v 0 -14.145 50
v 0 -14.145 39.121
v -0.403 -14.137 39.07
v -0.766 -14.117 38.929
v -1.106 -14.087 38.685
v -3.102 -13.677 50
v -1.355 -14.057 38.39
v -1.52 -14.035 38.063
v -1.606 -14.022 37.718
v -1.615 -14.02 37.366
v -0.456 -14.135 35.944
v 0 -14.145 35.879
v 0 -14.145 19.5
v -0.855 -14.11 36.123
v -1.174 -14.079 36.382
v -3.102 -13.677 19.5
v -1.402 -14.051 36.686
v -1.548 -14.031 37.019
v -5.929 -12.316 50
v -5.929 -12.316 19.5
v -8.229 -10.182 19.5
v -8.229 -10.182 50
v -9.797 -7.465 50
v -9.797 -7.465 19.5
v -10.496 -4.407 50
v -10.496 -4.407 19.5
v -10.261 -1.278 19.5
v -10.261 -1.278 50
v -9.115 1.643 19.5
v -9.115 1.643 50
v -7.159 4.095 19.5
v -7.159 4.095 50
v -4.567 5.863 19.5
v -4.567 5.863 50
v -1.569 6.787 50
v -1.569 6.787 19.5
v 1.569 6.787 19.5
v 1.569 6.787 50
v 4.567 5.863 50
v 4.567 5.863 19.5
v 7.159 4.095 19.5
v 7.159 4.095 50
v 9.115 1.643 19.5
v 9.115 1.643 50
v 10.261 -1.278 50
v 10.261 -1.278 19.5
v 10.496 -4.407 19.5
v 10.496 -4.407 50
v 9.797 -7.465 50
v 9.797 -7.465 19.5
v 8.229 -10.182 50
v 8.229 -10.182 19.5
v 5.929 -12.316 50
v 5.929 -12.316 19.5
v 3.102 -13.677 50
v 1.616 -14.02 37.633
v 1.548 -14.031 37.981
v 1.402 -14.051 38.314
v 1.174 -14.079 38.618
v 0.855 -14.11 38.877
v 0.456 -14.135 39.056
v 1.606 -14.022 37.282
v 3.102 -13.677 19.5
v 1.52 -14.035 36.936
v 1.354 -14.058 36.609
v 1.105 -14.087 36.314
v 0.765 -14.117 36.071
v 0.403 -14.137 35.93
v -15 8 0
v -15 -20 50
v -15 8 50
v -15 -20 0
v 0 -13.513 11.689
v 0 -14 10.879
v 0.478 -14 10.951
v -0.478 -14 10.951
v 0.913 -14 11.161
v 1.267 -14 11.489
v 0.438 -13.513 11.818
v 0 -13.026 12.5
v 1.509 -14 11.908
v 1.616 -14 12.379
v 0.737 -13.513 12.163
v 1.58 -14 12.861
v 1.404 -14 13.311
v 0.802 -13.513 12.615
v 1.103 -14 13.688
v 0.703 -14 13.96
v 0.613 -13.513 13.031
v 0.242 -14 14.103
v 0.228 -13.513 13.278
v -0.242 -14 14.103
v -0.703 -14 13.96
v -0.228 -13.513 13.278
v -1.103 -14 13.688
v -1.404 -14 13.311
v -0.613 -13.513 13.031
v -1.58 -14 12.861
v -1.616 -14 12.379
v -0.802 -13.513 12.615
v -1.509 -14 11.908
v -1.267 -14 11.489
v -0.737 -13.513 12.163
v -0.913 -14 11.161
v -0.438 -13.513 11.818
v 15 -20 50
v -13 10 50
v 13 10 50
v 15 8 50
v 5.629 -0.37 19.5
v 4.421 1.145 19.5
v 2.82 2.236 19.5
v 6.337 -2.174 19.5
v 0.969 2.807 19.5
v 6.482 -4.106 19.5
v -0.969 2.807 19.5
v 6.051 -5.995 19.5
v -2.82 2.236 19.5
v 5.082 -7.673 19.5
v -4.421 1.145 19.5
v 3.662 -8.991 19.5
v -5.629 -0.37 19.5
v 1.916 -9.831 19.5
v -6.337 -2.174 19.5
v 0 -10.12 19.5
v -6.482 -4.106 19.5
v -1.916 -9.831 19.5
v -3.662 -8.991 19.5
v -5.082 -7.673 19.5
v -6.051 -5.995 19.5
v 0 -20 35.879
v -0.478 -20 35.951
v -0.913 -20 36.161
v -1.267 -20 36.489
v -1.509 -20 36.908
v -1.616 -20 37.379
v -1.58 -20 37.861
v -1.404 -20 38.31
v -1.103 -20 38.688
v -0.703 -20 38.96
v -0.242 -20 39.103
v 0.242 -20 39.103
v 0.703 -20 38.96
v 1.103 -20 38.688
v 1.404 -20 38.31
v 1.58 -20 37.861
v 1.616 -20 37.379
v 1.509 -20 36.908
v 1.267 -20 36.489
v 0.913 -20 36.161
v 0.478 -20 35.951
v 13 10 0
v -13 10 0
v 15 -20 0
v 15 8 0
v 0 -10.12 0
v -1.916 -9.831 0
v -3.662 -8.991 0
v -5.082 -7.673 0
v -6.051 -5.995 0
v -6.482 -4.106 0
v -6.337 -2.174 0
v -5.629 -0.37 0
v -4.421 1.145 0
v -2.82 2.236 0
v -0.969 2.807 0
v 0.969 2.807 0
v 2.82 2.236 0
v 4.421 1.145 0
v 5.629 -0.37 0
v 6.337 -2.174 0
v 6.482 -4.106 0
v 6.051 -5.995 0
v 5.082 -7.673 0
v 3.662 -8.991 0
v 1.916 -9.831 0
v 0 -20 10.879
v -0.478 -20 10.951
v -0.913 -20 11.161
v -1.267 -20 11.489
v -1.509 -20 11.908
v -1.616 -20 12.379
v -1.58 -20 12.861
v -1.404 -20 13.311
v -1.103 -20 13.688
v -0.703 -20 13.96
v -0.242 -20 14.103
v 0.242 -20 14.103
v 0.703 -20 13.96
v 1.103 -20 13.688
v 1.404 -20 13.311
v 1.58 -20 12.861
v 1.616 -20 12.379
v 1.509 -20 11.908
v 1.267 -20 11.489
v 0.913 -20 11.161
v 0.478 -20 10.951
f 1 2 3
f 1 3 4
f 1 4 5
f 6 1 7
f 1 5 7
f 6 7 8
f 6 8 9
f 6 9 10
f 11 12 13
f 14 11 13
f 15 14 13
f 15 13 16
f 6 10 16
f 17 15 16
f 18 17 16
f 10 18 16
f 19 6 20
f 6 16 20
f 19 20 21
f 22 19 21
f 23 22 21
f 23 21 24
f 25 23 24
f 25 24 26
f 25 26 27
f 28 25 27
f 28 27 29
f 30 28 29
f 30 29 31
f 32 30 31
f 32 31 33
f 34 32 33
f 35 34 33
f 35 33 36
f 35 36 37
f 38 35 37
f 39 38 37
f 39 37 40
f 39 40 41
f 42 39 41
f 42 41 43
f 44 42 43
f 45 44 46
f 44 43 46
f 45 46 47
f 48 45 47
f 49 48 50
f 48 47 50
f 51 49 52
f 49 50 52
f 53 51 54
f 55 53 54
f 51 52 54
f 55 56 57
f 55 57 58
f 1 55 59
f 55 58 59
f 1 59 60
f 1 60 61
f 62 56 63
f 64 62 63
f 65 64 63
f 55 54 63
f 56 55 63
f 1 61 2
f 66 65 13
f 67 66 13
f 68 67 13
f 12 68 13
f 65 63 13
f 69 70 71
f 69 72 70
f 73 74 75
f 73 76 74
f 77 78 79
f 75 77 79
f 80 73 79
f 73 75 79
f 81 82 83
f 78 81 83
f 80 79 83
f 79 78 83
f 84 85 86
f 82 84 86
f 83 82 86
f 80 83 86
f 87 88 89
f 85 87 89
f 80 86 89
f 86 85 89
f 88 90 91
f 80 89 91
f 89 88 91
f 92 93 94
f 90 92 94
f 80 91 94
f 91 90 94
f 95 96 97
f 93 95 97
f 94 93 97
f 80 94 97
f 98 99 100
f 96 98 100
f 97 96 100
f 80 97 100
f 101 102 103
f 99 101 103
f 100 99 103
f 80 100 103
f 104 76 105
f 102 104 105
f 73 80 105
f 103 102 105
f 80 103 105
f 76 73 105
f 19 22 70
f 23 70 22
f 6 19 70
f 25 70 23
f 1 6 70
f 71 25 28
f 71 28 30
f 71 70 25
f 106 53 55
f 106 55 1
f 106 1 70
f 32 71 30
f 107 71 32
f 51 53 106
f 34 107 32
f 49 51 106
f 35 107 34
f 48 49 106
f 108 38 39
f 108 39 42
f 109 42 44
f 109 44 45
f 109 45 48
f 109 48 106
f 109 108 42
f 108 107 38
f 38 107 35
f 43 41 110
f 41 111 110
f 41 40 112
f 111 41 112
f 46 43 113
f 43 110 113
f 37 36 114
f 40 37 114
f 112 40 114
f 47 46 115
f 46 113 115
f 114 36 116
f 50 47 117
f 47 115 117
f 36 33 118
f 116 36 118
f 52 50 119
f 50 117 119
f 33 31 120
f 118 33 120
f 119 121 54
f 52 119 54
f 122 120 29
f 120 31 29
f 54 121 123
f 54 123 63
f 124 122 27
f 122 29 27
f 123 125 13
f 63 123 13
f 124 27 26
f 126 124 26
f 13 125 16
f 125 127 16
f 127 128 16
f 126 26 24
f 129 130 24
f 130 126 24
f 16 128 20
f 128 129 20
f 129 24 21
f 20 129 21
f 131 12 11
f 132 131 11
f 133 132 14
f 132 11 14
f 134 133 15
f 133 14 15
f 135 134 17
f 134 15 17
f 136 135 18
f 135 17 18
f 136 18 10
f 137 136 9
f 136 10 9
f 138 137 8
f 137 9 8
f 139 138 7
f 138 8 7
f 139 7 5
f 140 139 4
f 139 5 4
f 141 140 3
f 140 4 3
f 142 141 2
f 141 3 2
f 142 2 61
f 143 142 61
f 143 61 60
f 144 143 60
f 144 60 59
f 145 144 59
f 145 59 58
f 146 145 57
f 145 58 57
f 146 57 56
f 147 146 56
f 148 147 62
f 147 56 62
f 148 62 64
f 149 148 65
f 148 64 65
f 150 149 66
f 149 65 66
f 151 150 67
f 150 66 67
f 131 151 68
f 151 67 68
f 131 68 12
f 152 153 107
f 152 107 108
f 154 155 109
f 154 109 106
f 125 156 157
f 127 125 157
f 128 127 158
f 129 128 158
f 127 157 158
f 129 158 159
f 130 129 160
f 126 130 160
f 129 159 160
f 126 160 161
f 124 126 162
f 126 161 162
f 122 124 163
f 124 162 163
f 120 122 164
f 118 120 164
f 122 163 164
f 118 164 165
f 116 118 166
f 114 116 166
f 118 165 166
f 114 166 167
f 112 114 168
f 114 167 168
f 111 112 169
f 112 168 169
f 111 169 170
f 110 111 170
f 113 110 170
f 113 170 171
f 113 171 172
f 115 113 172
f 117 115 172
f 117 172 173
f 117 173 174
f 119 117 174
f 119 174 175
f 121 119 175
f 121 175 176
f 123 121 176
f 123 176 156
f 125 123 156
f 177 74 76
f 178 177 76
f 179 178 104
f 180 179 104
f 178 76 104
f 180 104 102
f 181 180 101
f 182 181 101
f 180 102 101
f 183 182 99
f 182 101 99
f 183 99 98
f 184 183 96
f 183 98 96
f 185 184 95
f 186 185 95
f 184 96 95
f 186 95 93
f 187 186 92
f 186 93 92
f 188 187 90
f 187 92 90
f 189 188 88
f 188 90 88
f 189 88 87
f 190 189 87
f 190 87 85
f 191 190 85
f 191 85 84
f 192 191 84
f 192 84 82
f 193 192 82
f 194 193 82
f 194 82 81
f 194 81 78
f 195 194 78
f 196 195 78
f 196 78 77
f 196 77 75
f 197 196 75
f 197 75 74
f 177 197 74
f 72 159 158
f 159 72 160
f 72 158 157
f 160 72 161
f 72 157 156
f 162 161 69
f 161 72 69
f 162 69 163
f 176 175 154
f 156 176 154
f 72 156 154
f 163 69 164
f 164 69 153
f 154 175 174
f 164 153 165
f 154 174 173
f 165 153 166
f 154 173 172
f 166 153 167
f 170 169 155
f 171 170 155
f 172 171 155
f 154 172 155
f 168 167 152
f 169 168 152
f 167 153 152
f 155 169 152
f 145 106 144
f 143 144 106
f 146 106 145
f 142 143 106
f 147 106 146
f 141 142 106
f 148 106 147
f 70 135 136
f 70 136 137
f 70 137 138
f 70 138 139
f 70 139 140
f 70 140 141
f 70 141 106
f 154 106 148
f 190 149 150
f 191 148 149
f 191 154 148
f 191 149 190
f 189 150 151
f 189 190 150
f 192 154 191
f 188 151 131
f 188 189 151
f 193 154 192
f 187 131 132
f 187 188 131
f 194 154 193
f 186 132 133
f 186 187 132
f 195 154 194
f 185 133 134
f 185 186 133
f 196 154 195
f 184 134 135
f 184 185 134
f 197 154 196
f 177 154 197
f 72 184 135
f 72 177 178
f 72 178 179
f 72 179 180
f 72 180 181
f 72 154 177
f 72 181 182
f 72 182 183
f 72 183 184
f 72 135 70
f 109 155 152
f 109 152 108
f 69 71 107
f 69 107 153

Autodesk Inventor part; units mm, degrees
ref_plane "YZ Plane" through (0, 0, 0) normal (1, 0, 0) x (0, 1, 0)
ref_plane "XZ Plane" through (0, 0, 0) normal (0, 1, 0) x (-1, 0, 0)
ref_plane "XY Plane" through (0, 0, 0) normal (0, 0, 1) x (1, 0, 0)
sketch "Esboço2" plane through (0, 0, 0) normal (0, 0, 1) x (1, 0, 0)
  line L0 (-15, 10) -> (15, 10)
  line L1 (15, 10) -> (15, -20)
  line L2 (15, -20) -> (-15, -20)
  line L3 (-15, -20) -> (-15, 10)
  line L4 (-15, 10) -> (15, -20) construction
  line L5 (15, 10) -> (-15, -20) construction
  point P0 (0, -5)
  dimension "d10" = 30
  dimension "d11" = 30
extrude "Extrusão1" add sketch "Esboço2" along normal blind 50
sketch "Esboço3" plane through (0, 0, 50) normal (0, 0, 1) x (1, 0, 0)
  line L0 (15, 10) -> (-15, 10) projected
  line L1 (0, 10) -> (0, -3.62)
  circle A0 centre (0, -3.62) radius 10.5
  point P0 (0, 0)
  dimension "d14" = 13.62
  dimension "d15" = 21
hole "Furo1" at (0, -3.62, 50) direction (0, 0, -1) diameter 13 end through all counterbore diameter 21.05 counterbore depth 30.5
sketch "Esboço4" plane through (-15, -20, 0) normal (0, -1, 0) x (1, 0, 0)
  line L0 (15, 0) -> (15, 50)
  line L1 (30, 50) -> (0, 50) projected
  circle A0 centre (15, 12.5) radius 1.6056 construction
  circle A1 centre (15, 37.5) radius 1.4692 construction
  line L2 (0, 0) -> (0, 50) construction
  line L3 (0, 25) -> (30, 25) construction
  line L4 (30, 0) -> (30, 50) construction
  dimension "d23" = 12.5
  dimension "d24" = 12.5
hole "Furo2" at (0, -20, 12.5) at (0, -20, 37.5) direction (0, 1, 0) diameter 3.242 depth 6 tip angle 118 thread size "M4x0.7" class "6H" standard "ANSI Metric M Profile"
chamfer "Chanfro1" distance 2 angle 45 2 edges at (15, 10, 25) (-15, 10, 25)
properties part number "blocoSuporteRolamentos"
